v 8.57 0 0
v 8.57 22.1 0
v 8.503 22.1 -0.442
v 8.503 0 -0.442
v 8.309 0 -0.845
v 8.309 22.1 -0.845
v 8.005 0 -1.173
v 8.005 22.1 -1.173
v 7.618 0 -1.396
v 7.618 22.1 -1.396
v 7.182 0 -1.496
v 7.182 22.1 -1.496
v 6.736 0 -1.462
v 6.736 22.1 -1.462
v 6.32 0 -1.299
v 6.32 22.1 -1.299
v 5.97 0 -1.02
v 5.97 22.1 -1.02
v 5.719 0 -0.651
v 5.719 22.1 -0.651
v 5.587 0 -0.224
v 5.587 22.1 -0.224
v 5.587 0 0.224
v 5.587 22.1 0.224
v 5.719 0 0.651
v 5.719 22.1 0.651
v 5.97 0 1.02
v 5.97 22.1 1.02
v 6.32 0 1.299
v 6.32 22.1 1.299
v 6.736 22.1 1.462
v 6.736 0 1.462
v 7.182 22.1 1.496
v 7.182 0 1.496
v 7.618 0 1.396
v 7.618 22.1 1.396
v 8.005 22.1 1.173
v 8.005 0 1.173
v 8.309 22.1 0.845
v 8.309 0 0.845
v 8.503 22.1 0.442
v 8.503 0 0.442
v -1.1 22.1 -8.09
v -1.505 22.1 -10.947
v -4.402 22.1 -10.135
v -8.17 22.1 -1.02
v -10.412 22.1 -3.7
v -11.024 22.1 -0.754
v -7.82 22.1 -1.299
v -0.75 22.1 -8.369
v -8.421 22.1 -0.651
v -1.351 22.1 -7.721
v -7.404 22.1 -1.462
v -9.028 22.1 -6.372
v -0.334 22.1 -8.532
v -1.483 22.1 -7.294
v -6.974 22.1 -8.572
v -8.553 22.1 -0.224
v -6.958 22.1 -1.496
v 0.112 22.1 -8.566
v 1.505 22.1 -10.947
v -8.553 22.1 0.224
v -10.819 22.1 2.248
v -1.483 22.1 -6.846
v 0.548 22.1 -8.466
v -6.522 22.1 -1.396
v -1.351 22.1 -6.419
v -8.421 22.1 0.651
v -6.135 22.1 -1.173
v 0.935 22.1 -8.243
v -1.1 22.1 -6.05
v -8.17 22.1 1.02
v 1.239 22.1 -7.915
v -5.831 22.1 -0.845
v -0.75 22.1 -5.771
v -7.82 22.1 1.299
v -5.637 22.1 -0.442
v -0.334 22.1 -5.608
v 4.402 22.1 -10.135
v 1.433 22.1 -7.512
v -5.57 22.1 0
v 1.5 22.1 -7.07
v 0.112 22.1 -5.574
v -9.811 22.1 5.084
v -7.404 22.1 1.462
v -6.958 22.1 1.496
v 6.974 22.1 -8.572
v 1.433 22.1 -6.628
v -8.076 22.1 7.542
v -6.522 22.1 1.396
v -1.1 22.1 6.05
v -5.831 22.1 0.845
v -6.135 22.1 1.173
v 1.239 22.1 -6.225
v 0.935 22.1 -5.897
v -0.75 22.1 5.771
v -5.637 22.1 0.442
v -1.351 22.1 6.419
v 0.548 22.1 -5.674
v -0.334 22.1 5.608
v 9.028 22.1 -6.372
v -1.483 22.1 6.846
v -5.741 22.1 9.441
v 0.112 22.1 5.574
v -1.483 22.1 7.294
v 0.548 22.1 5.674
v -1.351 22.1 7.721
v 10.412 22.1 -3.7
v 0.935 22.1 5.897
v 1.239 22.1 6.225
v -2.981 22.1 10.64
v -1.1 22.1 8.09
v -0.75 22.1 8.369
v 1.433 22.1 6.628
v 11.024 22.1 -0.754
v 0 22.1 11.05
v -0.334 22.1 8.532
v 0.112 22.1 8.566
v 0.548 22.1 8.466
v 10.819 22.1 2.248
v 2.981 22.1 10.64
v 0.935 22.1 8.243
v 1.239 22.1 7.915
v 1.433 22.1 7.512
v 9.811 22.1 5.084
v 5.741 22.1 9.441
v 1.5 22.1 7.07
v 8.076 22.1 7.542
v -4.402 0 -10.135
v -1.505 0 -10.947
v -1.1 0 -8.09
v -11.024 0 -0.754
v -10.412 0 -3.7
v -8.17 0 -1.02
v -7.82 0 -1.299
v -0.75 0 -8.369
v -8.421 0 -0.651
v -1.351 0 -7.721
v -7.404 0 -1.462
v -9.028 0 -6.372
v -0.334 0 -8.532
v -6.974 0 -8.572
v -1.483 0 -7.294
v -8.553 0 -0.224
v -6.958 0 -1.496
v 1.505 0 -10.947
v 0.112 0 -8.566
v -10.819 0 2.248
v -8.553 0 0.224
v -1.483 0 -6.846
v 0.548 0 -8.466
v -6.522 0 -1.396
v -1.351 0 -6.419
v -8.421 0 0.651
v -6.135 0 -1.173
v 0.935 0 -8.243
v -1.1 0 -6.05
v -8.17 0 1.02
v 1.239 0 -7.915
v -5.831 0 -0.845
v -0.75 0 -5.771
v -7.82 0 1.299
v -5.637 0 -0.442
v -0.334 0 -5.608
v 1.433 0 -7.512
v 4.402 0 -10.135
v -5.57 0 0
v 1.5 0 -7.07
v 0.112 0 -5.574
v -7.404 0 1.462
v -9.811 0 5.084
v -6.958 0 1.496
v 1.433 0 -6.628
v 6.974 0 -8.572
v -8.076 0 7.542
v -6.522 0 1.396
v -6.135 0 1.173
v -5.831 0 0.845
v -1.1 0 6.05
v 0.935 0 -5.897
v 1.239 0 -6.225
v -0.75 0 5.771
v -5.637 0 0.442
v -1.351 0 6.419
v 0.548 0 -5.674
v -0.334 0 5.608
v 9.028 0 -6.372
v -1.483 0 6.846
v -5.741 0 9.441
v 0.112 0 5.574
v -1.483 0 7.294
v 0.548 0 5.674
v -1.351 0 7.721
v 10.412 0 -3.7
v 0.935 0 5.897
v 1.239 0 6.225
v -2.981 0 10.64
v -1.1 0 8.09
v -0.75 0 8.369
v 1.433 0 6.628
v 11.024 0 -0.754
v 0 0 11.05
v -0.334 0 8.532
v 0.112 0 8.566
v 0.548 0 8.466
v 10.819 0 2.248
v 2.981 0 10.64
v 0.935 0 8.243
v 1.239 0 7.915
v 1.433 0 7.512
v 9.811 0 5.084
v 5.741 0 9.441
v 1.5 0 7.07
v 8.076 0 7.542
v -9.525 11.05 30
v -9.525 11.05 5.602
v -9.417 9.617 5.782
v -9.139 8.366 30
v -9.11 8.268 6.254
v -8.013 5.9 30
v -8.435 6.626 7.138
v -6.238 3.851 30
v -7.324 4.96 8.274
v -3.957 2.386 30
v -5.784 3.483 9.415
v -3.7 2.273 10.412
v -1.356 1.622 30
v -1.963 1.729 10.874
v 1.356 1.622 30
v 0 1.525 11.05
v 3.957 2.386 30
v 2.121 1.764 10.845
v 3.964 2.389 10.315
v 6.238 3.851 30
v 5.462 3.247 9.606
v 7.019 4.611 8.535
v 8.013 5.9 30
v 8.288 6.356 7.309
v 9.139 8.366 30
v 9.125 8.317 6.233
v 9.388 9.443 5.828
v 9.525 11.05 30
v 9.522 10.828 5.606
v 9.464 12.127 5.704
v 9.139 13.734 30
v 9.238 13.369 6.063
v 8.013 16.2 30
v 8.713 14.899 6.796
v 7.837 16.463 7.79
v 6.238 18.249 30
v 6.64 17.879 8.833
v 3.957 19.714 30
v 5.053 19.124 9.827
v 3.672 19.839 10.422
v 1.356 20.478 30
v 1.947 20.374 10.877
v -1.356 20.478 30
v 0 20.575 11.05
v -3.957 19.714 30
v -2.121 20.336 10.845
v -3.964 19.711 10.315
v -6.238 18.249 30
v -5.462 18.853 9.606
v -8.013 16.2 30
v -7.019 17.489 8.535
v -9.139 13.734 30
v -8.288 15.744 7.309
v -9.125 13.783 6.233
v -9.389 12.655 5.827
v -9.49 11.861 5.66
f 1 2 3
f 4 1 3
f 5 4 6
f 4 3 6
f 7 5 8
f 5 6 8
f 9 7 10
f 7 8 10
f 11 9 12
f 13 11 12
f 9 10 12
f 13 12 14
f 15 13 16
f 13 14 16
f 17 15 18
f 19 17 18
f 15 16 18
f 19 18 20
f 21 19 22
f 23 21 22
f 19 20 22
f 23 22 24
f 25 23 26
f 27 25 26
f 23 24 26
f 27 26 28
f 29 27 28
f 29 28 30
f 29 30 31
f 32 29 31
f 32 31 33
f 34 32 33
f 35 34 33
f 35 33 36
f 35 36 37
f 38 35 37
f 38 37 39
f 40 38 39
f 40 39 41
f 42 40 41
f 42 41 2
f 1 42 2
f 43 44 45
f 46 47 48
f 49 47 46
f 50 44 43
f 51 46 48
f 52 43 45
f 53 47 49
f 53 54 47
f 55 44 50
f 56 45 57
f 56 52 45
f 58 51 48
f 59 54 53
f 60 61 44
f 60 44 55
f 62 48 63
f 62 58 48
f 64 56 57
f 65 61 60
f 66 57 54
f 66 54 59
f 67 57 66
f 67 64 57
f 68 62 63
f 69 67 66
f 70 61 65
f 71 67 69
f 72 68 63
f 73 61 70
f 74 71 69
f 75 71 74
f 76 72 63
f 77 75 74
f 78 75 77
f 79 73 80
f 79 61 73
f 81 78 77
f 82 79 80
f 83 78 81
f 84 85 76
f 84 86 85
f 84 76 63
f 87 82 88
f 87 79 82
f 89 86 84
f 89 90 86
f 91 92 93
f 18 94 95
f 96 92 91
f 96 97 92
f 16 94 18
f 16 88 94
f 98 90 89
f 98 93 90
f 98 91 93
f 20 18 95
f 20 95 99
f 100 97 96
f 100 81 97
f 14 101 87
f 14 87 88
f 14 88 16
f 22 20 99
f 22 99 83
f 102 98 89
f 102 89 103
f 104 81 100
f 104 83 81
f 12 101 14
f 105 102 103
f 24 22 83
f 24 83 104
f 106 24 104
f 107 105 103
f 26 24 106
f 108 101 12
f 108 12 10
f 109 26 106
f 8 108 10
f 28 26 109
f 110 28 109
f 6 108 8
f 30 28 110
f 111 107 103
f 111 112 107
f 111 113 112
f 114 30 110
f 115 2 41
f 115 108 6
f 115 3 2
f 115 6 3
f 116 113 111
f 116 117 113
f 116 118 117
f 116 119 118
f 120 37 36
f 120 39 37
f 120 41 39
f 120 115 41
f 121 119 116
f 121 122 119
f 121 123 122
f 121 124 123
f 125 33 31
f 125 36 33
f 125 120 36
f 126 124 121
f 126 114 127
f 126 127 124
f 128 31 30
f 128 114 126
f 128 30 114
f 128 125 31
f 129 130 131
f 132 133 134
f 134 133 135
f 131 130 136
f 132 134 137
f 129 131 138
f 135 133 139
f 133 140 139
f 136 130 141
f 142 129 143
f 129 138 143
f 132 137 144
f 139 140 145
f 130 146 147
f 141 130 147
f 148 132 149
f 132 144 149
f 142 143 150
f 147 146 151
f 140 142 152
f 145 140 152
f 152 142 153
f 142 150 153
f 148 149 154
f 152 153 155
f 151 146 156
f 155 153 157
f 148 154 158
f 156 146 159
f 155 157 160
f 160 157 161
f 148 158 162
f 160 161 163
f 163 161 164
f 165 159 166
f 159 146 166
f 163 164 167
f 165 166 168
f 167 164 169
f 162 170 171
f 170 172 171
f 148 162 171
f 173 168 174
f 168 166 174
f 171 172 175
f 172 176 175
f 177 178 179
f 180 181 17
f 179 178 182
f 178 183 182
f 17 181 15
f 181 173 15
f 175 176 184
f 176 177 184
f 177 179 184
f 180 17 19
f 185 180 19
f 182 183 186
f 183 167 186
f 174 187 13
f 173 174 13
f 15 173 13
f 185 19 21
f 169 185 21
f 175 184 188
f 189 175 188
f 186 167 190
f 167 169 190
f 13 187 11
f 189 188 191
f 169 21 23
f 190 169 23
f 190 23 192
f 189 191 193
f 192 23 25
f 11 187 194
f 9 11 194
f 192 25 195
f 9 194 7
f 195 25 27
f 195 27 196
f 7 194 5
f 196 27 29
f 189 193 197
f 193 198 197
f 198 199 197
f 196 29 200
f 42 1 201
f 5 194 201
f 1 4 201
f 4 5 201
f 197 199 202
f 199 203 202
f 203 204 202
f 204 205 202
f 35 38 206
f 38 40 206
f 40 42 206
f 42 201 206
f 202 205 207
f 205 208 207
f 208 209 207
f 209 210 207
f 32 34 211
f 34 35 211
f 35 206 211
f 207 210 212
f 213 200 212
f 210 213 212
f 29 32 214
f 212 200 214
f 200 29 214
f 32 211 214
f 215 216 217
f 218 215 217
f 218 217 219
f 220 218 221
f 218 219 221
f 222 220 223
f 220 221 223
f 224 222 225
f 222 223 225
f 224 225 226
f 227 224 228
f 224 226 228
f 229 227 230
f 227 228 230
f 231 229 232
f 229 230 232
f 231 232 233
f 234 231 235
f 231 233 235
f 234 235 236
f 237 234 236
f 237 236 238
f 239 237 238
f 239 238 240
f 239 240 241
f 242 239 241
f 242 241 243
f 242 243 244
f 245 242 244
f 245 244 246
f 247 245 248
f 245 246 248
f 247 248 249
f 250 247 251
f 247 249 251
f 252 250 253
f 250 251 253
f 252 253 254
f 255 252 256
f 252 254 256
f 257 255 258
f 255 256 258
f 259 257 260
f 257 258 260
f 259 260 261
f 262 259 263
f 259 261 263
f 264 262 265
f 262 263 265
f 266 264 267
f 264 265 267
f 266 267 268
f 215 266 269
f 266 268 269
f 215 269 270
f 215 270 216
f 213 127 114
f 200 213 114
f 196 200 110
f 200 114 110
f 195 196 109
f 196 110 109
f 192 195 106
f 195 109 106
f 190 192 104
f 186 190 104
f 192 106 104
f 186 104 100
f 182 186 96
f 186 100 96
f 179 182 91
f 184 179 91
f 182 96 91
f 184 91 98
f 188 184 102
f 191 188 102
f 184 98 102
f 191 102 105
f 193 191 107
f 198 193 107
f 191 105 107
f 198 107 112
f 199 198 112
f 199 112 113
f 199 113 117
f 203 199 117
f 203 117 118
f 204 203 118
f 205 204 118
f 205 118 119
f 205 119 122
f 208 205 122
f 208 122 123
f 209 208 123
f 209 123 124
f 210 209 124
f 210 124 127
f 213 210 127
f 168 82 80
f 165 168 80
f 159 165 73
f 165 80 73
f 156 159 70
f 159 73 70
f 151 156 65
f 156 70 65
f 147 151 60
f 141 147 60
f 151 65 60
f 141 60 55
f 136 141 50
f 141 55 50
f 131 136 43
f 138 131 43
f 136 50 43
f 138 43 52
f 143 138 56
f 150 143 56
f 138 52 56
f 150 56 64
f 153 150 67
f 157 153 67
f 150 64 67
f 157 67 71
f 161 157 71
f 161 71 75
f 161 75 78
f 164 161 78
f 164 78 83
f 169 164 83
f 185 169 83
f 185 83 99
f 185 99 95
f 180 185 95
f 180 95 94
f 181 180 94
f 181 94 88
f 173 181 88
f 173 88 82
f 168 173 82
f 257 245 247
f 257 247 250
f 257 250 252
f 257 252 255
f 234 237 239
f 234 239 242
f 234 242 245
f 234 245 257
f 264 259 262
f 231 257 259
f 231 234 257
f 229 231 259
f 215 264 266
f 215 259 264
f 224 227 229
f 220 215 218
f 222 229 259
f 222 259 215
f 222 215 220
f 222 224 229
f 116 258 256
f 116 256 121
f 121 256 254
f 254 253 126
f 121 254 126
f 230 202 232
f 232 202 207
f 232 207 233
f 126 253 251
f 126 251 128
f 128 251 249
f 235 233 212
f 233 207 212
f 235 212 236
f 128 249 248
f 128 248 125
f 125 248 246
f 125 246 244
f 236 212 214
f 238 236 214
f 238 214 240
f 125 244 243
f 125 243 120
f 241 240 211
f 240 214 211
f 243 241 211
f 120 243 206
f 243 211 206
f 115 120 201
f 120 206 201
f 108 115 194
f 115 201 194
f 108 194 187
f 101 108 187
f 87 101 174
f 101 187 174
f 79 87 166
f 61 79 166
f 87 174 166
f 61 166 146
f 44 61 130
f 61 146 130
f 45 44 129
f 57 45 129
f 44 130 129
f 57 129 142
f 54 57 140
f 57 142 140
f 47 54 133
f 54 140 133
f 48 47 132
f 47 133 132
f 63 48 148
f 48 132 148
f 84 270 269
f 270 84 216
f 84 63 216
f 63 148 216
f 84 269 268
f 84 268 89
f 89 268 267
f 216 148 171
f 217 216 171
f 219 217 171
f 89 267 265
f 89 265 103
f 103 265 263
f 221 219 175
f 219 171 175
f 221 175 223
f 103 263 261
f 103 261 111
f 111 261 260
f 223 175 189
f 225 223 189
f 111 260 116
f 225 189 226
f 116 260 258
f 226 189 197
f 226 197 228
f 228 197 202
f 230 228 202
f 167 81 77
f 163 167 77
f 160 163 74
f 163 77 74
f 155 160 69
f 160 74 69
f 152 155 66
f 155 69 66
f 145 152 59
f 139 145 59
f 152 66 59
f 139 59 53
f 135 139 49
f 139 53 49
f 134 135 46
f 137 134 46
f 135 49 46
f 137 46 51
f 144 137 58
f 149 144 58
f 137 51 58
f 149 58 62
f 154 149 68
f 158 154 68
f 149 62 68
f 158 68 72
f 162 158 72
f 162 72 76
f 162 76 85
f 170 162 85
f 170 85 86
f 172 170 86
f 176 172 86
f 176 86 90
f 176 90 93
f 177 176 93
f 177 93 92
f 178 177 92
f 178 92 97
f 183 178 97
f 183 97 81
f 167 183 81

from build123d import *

# Parameters (mm, degrees)
SKETCH1_R             = 11.05
BOSS_EXTRUDE1_DEPTH   = 22.1
SKETCH4_R             = 9.525
BOSS_EXTRUDE3_DEPTH   = 30
F_3_0MM_DOWEL_HOLE1_D = 3


with BuildPart() as part:
    # Sketch1 → Boss-Extrude1 (new body)
    with BuildSketch(Plane(origin=(0, 0, 0), x_dir=(1, 0, 0), z_dir=(0, 1, 0))):
        with Locations(Location((0, 0, 0), (0, 0, 270))):
            Circle(SKETCH1_R)
    extrude(amount=BOSS_EXTRUDE1_DEPTH)

    # Sketch4 → Boss-Extrude3 (add)
    with BuildSketch(Plane.XY):
        with Locations(Location((0, 11.05, 0), (0, 0, 180))):
            Circle(SKETCH4_R)
    extrude(amount=BOSS_EXTRUDE3_DEPTH)

    # Ø3.0mm Dowel Hole1 (through all)
    with Locations(Plane(origin=(0, 0, 0), x_dir=(-1, 0, 0), z_dir=(0, -1, 0))):
        with Locations((7.07, 0), (0, 7.07), (-7.07, 0), (0, -7.07)):
            Hole(F_3_0MM_DOWEL_HOLE1_D / 2)


solid = part.part
